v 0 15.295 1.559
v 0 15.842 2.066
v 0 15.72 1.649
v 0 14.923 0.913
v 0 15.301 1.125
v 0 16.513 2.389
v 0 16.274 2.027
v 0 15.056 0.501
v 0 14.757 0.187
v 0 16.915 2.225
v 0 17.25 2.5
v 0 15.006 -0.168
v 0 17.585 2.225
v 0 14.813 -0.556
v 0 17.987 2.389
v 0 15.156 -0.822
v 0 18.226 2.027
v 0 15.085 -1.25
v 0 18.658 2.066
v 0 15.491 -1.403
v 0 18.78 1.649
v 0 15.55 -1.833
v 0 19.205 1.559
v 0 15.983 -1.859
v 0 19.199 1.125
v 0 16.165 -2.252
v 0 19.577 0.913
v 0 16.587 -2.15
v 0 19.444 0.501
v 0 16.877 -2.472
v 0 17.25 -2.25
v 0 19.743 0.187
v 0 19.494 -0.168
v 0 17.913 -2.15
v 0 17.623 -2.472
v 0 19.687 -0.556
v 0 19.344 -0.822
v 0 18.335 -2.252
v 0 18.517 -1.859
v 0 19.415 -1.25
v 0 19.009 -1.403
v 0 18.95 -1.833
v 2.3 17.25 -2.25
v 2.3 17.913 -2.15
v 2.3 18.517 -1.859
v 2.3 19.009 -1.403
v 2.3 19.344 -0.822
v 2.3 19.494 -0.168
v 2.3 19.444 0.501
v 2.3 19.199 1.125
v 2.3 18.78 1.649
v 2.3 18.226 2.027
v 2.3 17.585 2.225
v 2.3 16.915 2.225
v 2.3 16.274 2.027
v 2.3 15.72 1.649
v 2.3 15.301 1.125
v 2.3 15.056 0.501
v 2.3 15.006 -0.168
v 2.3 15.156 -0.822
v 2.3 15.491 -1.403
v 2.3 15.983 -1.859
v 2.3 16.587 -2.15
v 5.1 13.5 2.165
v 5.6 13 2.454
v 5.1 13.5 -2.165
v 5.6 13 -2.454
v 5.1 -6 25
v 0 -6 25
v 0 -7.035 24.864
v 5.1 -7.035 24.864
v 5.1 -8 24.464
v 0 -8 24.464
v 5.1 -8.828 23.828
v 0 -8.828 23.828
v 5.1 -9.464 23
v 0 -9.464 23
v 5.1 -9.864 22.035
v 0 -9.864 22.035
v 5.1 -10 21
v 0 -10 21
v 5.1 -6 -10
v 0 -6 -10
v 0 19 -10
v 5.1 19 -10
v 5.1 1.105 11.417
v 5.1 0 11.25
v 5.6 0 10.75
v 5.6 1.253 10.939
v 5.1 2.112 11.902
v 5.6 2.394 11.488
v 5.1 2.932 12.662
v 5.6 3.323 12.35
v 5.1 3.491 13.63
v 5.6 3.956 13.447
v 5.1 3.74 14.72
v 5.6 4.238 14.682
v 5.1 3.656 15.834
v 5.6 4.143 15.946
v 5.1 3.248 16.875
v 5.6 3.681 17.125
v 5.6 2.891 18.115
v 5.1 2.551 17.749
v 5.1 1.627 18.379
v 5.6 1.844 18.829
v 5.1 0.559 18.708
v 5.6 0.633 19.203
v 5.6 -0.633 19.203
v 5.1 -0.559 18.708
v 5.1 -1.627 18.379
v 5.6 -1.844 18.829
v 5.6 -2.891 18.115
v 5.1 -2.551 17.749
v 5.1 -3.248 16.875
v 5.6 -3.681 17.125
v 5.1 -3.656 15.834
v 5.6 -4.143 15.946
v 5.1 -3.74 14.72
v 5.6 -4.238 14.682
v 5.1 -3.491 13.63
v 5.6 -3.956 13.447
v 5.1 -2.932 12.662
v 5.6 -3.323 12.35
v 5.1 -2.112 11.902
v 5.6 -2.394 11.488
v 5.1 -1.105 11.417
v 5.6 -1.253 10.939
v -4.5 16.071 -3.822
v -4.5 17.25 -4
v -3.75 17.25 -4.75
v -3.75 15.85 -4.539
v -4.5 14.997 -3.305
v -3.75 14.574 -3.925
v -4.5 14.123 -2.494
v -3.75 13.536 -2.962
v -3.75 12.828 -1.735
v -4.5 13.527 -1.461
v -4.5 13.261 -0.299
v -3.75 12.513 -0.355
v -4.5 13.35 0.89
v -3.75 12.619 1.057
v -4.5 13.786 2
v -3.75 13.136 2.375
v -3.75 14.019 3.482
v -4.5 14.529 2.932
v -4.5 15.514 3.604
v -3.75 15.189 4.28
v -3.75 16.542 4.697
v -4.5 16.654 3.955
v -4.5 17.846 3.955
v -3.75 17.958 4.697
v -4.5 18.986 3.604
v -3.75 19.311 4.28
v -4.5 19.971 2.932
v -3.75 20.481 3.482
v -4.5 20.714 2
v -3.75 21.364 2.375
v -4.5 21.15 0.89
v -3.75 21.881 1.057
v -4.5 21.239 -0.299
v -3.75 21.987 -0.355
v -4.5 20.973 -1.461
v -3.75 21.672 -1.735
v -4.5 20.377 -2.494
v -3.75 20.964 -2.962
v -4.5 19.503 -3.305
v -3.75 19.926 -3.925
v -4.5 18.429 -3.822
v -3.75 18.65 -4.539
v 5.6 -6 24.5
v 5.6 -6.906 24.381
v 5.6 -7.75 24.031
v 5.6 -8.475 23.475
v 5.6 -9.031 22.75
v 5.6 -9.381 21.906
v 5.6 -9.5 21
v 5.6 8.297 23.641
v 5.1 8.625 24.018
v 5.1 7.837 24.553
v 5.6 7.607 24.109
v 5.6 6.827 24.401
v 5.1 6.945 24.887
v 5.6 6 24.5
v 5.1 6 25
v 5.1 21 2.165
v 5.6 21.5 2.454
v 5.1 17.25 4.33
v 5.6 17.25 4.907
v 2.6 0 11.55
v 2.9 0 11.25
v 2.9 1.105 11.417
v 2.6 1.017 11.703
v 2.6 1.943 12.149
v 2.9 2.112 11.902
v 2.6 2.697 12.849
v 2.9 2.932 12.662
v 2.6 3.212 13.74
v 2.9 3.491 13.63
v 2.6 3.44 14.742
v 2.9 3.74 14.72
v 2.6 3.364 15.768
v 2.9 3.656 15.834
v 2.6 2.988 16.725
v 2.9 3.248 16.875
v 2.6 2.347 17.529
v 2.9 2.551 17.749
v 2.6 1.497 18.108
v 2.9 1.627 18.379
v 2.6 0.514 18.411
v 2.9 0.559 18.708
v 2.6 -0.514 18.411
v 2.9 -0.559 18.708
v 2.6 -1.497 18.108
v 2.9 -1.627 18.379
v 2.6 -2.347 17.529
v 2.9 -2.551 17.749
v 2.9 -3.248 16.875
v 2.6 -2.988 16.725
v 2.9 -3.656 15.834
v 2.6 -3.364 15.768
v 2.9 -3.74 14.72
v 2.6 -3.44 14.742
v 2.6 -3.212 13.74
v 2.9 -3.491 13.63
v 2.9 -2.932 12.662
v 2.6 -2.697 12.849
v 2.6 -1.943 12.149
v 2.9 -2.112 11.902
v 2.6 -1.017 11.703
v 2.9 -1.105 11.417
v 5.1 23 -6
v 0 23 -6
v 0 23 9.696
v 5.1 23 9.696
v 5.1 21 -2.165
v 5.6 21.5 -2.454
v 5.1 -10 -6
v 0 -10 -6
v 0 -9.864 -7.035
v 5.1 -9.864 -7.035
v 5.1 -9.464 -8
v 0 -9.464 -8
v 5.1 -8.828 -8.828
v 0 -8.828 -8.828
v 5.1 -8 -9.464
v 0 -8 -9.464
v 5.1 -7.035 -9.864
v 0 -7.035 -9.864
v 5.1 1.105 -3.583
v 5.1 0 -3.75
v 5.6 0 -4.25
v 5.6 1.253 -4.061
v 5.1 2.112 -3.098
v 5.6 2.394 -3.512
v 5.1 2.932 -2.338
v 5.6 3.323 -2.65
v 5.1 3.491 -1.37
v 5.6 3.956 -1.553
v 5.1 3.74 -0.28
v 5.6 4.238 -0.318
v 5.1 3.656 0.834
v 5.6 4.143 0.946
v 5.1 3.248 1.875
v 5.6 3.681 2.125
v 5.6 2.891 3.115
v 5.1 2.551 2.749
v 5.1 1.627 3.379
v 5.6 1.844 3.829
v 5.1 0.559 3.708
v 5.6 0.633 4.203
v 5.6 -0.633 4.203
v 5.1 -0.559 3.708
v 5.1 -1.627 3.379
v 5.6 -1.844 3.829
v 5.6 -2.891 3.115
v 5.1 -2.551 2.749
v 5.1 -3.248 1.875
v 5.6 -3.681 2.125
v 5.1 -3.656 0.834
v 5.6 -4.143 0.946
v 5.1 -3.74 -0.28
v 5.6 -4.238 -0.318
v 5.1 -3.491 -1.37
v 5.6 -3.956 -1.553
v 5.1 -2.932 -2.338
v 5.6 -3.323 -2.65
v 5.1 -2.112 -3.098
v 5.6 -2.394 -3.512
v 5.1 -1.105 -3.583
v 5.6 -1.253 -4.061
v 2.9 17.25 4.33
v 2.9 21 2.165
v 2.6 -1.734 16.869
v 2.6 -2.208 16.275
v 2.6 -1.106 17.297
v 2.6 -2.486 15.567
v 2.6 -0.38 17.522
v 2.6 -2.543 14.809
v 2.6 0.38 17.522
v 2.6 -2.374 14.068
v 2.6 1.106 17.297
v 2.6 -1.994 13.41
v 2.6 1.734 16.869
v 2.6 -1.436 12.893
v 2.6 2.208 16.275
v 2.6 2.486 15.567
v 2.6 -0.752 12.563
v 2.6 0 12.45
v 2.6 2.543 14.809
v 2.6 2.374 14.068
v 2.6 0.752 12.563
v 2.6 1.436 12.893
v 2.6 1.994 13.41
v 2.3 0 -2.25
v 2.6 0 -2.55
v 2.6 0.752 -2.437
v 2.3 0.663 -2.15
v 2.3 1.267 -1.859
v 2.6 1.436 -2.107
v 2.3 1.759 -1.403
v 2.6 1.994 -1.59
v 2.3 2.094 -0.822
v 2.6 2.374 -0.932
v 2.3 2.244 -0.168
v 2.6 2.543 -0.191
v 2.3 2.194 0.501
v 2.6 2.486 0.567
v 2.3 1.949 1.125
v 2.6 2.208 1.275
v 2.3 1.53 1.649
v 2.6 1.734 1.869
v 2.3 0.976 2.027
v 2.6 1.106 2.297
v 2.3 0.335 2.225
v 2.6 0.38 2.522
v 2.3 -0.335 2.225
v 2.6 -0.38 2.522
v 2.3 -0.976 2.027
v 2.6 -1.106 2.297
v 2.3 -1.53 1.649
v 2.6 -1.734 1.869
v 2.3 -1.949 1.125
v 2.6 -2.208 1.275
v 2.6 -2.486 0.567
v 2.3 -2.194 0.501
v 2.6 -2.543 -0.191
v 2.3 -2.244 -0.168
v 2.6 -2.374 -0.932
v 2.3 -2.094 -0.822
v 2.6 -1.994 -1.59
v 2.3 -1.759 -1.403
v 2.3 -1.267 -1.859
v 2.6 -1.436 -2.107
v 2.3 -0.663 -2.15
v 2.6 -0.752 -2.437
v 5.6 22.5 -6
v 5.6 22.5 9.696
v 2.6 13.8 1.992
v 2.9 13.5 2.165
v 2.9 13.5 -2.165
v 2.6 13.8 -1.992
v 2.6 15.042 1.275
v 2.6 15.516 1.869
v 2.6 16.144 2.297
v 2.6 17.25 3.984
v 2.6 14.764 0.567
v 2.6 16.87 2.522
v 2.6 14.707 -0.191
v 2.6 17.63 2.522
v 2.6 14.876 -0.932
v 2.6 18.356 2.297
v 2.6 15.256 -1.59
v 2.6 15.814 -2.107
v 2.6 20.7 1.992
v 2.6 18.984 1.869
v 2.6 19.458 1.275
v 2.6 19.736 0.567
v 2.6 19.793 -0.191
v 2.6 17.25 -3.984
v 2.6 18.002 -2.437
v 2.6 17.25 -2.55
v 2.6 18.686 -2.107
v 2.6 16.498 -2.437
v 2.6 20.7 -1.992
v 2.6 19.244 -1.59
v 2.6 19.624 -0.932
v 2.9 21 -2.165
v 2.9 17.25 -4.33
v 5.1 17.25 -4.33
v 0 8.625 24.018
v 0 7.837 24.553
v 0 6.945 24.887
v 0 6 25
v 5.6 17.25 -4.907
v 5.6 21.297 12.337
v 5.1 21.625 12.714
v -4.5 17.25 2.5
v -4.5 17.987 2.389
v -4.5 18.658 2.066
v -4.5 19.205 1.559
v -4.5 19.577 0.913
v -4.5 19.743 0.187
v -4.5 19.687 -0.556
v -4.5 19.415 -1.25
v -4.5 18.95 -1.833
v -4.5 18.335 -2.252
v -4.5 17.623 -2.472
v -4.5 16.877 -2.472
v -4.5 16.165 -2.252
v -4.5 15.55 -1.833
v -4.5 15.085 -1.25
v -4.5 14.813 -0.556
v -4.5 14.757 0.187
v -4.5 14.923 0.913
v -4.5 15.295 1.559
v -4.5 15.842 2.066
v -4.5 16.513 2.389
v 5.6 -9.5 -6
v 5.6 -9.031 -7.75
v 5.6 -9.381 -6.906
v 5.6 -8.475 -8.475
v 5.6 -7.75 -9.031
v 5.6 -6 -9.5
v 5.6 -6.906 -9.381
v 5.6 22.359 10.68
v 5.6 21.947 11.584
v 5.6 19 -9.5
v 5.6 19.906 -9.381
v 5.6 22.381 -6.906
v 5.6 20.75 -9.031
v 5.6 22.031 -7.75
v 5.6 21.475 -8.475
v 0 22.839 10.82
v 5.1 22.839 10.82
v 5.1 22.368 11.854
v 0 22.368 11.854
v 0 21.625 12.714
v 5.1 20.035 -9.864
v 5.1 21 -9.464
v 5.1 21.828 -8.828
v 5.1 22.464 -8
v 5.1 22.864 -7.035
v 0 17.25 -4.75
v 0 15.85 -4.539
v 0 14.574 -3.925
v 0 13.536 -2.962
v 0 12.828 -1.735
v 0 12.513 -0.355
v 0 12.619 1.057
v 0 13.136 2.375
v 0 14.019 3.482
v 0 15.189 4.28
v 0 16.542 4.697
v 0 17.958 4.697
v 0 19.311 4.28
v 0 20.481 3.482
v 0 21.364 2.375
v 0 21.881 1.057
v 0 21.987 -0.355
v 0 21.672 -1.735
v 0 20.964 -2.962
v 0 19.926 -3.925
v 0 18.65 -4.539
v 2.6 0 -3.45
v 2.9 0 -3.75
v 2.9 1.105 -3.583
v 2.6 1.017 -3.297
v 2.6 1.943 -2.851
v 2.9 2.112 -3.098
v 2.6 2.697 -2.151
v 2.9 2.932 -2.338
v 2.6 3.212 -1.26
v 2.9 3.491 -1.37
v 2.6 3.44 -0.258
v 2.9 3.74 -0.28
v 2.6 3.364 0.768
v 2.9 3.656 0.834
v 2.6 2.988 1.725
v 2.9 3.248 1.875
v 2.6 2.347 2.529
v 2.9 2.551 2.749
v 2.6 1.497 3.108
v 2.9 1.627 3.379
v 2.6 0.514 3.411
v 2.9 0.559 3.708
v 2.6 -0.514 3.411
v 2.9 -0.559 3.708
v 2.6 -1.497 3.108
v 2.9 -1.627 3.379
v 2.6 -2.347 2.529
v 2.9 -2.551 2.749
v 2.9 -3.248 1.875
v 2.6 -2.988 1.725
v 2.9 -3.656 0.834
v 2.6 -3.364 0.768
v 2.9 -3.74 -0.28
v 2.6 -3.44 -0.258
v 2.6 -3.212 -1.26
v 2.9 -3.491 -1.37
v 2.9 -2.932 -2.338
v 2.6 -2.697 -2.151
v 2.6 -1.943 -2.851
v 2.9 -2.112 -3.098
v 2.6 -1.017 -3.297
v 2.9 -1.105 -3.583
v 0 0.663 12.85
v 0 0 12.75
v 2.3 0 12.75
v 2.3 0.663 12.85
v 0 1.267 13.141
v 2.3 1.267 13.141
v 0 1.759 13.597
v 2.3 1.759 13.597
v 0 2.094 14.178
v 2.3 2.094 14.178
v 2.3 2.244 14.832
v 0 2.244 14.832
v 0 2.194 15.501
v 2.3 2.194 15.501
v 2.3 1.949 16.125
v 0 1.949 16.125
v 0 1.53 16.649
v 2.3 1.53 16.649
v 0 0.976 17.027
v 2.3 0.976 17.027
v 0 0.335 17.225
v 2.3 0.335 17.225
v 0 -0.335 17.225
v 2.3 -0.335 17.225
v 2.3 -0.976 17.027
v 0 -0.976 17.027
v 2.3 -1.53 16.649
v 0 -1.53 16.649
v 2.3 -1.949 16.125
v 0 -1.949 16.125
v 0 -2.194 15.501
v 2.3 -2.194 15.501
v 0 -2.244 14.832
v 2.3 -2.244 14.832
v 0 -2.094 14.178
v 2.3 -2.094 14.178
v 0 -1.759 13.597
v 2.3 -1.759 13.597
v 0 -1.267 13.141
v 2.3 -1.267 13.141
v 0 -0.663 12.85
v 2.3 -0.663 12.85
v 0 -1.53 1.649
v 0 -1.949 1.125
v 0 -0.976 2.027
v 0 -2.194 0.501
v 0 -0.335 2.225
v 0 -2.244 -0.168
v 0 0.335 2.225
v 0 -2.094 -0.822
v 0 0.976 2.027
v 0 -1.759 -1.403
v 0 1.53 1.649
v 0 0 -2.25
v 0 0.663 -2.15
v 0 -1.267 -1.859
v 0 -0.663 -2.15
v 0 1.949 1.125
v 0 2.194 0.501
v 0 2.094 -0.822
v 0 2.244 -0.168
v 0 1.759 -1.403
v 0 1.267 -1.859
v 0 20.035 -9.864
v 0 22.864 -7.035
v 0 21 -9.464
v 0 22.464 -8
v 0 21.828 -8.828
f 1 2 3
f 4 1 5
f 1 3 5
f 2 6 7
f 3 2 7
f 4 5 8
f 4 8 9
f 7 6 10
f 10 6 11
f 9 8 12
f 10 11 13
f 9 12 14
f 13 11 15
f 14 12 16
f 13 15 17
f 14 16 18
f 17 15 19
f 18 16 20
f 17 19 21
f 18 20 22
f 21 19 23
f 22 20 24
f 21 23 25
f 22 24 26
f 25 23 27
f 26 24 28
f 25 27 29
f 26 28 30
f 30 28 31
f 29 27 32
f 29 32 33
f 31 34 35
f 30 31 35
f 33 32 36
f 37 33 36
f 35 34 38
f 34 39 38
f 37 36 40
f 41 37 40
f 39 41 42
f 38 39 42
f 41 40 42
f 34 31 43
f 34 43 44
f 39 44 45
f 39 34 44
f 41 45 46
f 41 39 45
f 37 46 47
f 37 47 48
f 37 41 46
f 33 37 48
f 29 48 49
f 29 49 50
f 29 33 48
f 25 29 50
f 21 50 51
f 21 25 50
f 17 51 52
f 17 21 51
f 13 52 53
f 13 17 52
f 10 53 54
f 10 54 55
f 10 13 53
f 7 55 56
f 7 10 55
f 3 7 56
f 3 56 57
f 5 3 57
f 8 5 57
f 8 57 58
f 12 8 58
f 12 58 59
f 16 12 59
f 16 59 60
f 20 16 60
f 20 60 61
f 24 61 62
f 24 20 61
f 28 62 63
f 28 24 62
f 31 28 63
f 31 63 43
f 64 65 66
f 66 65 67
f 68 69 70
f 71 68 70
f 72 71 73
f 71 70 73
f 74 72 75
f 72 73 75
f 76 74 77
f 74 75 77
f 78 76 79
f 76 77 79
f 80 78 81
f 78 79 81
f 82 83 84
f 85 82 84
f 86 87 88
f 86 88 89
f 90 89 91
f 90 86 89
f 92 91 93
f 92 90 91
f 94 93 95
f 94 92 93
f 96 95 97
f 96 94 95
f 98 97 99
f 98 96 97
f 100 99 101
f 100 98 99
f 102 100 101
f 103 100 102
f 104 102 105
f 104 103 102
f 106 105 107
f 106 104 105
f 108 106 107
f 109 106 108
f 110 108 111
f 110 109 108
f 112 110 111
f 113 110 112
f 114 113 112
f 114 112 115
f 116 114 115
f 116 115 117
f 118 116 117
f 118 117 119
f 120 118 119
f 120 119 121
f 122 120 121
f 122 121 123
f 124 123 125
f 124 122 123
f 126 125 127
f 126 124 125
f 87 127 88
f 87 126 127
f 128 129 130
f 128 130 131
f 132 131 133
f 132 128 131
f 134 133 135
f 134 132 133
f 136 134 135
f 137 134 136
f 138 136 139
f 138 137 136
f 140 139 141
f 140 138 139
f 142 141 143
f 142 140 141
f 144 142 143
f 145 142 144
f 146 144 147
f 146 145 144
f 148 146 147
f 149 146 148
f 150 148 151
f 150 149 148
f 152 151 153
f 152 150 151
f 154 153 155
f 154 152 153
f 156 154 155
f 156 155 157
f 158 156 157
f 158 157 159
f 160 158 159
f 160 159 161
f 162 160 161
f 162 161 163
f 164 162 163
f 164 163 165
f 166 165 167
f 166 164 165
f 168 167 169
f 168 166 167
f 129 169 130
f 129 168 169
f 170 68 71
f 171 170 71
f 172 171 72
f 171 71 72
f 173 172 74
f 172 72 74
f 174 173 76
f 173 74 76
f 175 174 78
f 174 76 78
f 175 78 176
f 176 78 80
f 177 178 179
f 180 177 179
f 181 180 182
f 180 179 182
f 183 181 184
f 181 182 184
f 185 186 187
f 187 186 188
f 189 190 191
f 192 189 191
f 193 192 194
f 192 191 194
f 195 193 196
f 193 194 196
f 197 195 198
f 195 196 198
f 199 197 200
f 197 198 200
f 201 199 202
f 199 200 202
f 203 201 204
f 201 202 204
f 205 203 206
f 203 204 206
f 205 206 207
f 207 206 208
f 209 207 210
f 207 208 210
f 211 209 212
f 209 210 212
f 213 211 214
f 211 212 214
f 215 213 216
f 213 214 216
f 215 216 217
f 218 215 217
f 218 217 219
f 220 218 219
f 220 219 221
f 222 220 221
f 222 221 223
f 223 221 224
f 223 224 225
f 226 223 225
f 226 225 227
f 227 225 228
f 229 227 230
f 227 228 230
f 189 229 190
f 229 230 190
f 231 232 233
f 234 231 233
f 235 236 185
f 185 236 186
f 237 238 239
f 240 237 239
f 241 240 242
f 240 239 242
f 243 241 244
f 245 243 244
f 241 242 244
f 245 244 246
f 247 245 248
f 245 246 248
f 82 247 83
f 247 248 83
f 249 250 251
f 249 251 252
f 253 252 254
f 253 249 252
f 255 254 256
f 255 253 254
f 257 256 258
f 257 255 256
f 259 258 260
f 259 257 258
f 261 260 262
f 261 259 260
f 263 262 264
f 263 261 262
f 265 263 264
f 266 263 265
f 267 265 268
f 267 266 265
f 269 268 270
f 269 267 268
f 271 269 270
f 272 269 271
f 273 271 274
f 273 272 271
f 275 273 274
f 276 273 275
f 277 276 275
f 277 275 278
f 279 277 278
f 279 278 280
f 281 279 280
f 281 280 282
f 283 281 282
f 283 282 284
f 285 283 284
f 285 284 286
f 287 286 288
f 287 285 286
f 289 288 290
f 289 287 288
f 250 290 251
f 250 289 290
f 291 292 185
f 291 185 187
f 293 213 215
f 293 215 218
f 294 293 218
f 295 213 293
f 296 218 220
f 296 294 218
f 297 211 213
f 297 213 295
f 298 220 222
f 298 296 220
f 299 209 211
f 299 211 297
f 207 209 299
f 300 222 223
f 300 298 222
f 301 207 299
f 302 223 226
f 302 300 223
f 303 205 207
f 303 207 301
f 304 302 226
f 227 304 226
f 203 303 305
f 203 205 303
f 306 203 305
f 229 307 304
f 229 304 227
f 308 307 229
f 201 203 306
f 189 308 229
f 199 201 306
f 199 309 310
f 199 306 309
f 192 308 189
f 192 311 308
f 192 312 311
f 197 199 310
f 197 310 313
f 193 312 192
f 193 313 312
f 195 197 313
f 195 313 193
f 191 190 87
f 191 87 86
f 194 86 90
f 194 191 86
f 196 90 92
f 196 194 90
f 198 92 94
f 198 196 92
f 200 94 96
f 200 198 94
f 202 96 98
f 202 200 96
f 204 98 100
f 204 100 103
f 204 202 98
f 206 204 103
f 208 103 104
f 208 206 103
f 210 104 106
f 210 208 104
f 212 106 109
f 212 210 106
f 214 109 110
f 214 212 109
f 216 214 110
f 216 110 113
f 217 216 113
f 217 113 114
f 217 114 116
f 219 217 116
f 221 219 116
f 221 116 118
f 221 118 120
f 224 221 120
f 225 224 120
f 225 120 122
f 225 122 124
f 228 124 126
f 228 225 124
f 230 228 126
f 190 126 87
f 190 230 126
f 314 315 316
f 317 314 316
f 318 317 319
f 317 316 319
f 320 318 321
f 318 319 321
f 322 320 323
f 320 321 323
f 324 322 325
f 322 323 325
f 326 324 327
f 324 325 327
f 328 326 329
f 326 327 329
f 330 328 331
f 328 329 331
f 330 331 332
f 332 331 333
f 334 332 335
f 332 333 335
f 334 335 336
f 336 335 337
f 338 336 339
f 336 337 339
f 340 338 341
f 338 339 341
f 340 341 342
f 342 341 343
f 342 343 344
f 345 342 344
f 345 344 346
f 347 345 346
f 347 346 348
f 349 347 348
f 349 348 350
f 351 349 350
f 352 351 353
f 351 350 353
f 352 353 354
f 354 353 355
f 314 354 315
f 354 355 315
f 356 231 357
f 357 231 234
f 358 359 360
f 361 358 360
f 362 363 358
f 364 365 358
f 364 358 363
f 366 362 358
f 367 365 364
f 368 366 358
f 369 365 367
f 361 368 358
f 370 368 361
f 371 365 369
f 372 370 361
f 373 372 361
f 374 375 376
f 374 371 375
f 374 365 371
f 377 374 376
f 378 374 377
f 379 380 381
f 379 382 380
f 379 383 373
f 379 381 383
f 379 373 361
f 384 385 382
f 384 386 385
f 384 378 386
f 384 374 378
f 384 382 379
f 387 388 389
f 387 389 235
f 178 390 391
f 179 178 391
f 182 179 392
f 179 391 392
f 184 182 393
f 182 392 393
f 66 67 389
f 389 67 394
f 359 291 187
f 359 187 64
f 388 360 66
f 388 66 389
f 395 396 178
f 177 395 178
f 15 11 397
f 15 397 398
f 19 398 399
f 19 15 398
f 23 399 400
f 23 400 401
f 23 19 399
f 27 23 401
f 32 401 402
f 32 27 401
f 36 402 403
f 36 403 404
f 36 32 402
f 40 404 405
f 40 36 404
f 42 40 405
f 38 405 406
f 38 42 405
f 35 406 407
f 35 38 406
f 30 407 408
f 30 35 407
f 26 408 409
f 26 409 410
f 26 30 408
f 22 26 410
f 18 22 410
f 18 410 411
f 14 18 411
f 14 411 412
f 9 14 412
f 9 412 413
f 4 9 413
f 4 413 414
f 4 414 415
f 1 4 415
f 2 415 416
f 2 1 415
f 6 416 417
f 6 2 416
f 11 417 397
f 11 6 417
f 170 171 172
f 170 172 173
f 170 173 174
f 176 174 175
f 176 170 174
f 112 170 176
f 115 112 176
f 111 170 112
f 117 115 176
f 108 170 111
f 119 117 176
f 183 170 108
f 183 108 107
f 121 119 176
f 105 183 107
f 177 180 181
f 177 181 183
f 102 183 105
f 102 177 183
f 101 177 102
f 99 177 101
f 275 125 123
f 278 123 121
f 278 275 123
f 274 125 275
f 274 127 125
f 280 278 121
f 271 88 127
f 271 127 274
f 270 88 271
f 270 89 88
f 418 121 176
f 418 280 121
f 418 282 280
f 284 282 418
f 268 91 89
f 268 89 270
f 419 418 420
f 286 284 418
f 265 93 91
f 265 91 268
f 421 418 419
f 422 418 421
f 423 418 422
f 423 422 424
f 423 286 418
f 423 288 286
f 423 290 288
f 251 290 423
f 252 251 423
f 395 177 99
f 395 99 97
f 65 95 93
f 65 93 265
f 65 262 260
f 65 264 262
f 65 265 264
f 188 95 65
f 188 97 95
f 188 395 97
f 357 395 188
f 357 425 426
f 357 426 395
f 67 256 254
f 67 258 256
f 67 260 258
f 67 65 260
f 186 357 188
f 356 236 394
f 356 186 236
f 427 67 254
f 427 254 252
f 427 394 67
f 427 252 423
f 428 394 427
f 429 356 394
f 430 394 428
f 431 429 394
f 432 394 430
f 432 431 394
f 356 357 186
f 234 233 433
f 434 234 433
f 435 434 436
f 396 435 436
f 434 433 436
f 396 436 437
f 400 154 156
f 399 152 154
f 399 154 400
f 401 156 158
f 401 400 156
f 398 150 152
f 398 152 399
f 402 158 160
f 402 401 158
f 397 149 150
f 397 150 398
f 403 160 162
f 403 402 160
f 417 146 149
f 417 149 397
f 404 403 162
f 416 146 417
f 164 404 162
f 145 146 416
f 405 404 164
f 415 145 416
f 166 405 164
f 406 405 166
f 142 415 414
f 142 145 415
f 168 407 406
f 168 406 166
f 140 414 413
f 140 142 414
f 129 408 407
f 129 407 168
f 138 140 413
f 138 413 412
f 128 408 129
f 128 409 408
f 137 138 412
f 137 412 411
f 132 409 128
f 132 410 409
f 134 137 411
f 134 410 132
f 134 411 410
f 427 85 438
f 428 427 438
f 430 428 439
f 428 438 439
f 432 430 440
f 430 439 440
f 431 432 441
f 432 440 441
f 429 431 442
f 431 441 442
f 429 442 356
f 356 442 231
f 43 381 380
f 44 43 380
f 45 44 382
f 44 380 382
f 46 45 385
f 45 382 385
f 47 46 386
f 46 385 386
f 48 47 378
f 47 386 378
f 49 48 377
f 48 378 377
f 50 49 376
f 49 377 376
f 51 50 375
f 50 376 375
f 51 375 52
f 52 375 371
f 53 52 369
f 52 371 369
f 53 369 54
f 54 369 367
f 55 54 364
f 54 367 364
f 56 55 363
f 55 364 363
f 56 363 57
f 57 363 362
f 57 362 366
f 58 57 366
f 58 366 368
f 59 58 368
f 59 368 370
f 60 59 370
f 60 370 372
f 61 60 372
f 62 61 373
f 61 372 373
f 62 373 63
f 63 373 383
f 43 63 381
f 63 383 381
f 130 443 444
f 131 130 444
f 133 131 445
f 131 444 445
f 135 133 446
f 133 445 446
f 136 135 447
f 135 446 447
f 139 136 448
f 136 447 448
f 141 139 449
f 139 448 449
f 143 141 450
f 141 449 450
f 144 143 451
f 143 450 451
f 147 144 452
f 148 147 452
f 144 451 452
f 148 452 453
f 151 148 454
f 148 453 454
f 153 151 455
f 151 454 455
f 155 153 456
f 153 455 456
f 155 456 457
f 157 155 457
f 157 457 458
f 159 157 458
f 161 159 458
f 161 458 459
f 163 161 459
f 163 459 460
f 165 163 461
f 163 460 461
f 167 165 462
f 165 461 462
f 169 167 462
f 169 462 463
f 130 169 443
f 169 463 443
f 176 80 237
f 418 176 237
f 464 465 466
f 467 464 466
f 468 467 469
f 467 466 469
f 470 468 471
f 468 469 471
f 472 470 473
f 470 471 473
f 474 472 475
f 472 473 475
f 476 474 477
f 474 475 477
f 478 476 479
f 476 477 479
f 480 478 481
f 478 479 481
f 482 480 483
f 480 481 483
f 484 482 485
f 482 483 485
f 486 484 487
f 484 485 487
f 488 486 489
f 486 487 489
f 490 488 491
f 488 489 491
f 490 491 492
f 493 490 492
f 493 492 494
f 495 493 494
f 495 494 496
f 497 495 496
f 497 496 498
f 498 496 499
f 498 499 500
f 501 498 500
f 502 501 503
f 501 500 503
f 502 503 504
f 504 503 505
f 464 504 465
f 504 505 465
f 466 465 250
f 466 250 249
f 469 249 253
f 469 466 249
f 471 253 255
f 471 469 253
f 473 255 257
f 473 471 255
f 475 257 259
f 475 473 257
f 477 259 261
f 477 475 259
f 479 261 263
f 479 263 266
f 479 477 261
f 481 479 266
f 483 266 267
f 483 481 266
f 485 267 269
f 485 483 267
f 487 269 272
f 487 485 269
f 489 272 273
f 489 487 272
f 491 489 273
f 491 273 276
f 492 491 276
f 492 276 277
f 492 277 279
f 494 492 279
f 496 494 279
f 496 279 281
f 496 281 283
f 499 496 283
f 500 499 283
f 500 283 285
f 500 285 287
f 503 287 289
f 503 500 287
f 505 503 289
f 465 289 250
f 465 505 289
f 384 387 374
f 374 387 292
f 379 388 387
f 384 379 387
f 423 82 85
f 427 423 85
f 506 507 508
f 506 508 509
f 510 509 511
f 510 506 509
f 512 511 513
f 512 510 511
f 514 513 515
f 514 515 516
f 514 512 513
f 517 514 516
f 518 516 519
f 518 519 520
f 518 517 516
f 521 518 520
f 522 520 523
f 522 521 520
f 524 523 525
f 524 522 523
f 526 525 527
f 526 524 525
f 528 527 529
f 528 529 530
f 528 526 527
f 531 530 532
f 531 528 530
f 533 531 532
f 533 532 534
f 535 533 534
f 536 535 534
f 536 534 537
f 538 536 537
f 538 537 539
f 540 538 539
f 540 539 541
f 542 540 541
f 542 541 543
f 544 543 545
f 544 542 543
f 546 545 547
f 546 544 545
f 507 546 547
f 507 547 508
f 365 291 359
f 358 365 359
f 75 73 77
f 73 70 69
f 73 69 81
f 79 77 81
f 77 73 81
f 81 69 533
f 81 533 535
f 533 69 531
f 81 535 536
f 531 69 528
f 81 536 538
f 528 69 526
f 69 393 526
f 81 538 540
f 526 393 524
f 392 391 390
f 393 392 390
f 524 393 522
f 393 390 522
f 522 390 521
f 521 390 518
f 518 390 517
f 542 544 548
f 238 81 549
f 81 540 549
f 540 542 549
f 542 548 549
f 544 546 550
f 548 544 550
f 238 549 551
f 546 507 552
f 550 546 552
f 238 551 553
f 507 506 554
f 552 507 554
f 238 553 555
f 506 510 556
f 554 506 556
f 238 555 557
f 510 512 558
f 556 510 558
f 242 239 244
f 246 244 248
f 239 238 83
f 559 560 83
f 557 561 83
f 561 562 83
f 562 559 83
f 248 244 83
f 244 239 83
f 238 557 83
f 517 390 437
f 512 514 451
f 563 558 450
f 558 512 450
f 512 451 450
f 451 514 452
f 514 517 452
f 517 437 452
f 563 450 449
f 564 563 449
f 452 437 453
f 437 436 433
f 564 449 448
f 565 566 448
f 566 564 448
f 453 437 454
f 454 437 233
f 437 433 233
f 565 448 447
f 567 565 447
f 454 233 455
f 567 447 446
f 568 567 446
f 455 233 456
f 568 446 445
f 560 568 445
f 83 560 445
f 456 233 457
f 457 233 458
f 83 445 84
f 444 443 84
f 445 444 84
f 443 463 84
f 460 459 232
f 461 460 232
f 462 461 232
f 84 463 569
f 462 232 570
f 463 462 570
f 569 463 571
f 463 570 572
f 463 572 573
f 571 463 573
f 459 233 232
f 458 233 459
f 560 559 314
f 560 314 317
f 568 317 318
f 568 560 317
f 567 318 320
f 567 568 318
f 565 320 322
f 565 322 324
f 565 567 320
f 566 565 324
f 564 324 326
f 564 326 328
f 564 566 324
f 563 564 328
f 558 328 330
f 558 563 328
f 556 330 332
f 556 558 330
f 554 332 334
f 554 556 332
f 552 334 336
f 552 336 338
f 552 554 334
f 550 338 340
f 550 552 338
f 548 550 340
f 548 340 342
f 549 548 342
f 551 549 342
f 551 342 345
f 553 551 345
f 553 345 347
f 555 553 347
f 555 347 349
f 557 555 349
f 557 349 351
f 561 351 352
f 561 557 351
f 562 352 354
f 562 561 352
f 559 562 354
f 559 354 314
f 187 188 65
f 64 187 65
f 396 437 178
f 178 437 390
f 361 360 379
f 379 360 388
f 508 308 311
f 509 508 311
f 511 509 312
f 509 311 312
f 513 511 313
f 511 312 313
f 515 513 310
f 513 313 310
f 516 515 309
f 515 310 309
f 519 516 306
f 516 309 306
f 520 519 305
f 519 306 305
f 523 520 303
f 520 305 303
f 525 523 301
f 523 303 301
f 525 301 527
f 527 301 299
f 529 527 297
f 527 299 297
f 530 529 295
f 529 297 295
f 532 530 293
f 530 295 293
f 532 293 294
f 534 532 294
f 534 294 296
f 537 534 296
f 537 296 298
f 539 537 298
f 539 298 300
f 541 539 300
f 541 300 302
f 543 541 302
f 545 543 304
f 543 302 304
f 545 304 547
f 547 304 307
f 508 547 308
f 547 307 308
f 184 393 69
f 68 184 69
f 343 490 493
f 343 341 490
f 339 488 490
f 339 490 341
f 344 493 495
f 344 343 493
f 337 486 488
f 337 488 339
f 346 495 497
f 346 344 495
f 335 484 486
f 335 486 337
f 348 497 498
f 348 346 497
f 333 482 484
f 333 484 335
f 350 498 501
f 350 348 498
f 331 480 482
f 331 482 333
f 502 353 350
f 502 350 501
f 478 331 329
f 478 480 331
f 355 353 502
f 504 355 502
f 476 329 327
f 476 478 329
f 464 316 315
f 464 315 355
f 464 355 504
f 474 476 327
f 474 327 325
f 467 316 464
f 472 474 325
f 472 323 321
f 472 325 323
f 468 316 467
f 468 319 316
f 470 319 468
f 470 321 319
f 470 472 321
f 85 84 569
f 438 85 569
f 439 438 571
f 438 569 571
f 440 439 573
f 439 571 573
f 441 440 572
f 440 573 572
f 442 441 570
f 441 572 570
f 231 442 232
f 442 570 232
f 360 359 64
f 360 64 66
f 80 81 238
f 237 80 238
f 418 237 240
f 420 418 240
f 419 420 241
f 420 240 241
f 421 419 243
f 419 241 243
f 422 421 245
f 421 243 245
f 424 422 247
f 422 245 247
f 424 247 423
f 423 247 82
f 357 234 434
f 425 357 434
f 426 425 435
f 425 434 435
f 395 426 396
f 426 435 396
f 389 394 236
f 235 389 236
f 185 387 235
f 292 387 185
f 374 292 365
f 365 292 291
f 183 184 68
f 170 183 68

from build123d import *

# Parameters (mm, degrees)
SKETCH1_R           = 2.25
BOSS_EXTRUDE1_DEPTH = 2.6
SKETCH2_R           = 4.75
SKETCH2_R_2         = 2.5
BOSS_EXTRUDE2_DEPTH = 4.5
CHAMFER1_SIZE       = 0.75
SKETCH3_R           = 3.75
BOSS_EXTRUDE3_DEPTH = 3
CHAMFER2_SIZE       = 0.3
CHAMFER3_SIZE       = 0.5


with BuildPart() as part:
    # Sketch1 → Boss-Extrude1 (new body)
    with BuildSketch(Plane(origin=(0, 0, 0), x_dir=(0, 0, -1), z_dir=(1, 0, 0))):
        with BuildLine():
            Line((-21, -10), (6, -10))
            ThreePointArc((6, -10), (8.828427125, -8.828427125), (10, -6))
            Line((10, -6), (10, 19))
            ThreePointArc((10, 19), (8.828427125, 21.828427125), (6, 23))
            Line((6, 23), (-9.695652174, 23))
            ThreePointArc((-9.695652174, 23), (-11.354136506, 22.63997661), (-12.714074263, 21.62471486))
            Line((-12.714074263, 21.62471486), (-24.018422089, 8.62471486))
            ThreePointArc((-24.018422089, 8.62471486), (-24.746577662, 7.401126626), (-25, 6))
            Line((-25, 6), (-25, -6))
            ThreePointArc((-25, -6), (-23.828427125, -8.828427125), (-21, -10))
        make_face()
        with Locations((-15, 0)):
            Circle(SKETCH1_R, mode=Mode.SUBTRACT)
        with Locations((0, 17.25)):
            Circle(SKETCH1_R, mode=Mode.SUBTRACT)
        Circle(SKETCH1_R, mode=Mode.SUBTRACT)
    extrude(amount=BOSS_EXTRUDE1_DEPTH)

    # Sketch2 → Boss-Extrude2 (add)
    with BuildSketch(Plane.ZY):
        with Locations(Location((0, 17.25, 0), (0, 0, 180))):
            Circle(SKETCH2_R)
        with Locations((0, 17.25)):
            Circle(SKETCH2_R_2, mode=Mode.SUBTRACT)
    extrude(amount=BOSS_EXTRUDE2_DEPTH)

    # Chamfer1
    chamfer1_edges = [part.edges().sort_by_distance(p)[0] for p in [
        (-4.5, 17.25, 4.75),
    ]]
    chamfer(chamfer1_edges, length=CHAMFER1_SIZE)

    # Sketch3 → Boss-Extrude3 (add)
    with BuildSketch(Plane(origin=(2.6, 0, 0), x_dir=(0, 0, -1), z_dir=(1, 0, 0))):
        with BuildLine():
            Line((-21, -10), (6, -10))
            ThreePointArc((6, -10), (8.828427125, -8.828427125), (10, -6))
            Line((10, -6), (10, 19))
            ThreePointArc((10, 19), (8.828427125, 21.828427125), (6, 23))
            Line((6, 23), (-9.695652174, 23))
            ThreePointArc((-9.695652174, 23), (-11.354136506, 22.63997661), (-12.714074263, 21.62471486))
            Line((-12.714074263, 21.62471486), (-24.018422089, 8.62471486))
            ThreePointArc((-24.018422089, 8.62471486), (-24.746577662, 7.401126626), (-25, 6))
            Line((-25, 6), (-25, -6))
            ThreePointArc((-25, -6), (-23.828427125, -8.828427125), (-21, -10))
        make_face()
        with Locations((-15, 0)):
            Circle(SKETCH3_R, mode=Mode.SUBTRACT)
        Circle(SKETCH3_R, mode=Mode.SUBTRACT)
        Polygon((2.165063509, 21), (-2.165063509, 21), (-4.330127019, 17.25), (-2.165063509, 13.5), (2.165063509, 13.5), (4.330127019, 17.25), align=None, mode=Mode.SUBTRACT)
    extrude(amount=BOSS_EXTRUDE3_DEPTH)

    # Chamfer2
    chamfer2_edges = [part.edges().sort_by_distance(p)[0] for p in [
        (2.6, 0, 17.25),
        (2.6, 17.25, 2.25),
        (2.6, 0, 2.25),
        (2.6, 0, 3.75),
        (2.6, 0, 18.75),
        (2.6, 19.125, -3.247595264),
        (2.6, 21, 0),
        (2.6, 19.125, 3.247595264),
        (2.6, 15.375, 3.247595264),
        (2.6, 13.5, 0),
        (2.6, 15.375, -3.247595264),
    ]]
    chamfer(chamfer2_edges, length=CHAMFER2_SIZE)

    # Chamfer3
    chamfer3_edges = [part.edges().sort_by_distance(p)[0] for p in [
        (5.6, -8.828427125, 23.828427125),
        (5.6, -10, 7.5),
        (5.6, -8.828427125, -8.828427125),
        (5.6, 6.5, -10),
        (5.6, 21.828427125, -8.828427125),
        (5.6, 23, 1.847826087),
        (5.6, 22.63997661, 11.354136506),
        (5.6, 15.12471486, 18.366248176),
        (5.6, 7.401126626, 24.746577662),
        (5.6, 0, 25),
        (5.6, 0, 18.75),
        (5.6, 0, 3.75),
        (5.6, 19.125, -3.247595264),
        (5.6, 21, 0),
        (5.6, 19.125, 3.247595264),
        (5.6, 15.375, 3.247595264),
        (5.6, 13.5, 0),
        (5.6, 15.375, -3.247595264),
    ]]
    chamfer(chamfer3_edges, length=CHAMFER3_SIZE)


solid = part.part
